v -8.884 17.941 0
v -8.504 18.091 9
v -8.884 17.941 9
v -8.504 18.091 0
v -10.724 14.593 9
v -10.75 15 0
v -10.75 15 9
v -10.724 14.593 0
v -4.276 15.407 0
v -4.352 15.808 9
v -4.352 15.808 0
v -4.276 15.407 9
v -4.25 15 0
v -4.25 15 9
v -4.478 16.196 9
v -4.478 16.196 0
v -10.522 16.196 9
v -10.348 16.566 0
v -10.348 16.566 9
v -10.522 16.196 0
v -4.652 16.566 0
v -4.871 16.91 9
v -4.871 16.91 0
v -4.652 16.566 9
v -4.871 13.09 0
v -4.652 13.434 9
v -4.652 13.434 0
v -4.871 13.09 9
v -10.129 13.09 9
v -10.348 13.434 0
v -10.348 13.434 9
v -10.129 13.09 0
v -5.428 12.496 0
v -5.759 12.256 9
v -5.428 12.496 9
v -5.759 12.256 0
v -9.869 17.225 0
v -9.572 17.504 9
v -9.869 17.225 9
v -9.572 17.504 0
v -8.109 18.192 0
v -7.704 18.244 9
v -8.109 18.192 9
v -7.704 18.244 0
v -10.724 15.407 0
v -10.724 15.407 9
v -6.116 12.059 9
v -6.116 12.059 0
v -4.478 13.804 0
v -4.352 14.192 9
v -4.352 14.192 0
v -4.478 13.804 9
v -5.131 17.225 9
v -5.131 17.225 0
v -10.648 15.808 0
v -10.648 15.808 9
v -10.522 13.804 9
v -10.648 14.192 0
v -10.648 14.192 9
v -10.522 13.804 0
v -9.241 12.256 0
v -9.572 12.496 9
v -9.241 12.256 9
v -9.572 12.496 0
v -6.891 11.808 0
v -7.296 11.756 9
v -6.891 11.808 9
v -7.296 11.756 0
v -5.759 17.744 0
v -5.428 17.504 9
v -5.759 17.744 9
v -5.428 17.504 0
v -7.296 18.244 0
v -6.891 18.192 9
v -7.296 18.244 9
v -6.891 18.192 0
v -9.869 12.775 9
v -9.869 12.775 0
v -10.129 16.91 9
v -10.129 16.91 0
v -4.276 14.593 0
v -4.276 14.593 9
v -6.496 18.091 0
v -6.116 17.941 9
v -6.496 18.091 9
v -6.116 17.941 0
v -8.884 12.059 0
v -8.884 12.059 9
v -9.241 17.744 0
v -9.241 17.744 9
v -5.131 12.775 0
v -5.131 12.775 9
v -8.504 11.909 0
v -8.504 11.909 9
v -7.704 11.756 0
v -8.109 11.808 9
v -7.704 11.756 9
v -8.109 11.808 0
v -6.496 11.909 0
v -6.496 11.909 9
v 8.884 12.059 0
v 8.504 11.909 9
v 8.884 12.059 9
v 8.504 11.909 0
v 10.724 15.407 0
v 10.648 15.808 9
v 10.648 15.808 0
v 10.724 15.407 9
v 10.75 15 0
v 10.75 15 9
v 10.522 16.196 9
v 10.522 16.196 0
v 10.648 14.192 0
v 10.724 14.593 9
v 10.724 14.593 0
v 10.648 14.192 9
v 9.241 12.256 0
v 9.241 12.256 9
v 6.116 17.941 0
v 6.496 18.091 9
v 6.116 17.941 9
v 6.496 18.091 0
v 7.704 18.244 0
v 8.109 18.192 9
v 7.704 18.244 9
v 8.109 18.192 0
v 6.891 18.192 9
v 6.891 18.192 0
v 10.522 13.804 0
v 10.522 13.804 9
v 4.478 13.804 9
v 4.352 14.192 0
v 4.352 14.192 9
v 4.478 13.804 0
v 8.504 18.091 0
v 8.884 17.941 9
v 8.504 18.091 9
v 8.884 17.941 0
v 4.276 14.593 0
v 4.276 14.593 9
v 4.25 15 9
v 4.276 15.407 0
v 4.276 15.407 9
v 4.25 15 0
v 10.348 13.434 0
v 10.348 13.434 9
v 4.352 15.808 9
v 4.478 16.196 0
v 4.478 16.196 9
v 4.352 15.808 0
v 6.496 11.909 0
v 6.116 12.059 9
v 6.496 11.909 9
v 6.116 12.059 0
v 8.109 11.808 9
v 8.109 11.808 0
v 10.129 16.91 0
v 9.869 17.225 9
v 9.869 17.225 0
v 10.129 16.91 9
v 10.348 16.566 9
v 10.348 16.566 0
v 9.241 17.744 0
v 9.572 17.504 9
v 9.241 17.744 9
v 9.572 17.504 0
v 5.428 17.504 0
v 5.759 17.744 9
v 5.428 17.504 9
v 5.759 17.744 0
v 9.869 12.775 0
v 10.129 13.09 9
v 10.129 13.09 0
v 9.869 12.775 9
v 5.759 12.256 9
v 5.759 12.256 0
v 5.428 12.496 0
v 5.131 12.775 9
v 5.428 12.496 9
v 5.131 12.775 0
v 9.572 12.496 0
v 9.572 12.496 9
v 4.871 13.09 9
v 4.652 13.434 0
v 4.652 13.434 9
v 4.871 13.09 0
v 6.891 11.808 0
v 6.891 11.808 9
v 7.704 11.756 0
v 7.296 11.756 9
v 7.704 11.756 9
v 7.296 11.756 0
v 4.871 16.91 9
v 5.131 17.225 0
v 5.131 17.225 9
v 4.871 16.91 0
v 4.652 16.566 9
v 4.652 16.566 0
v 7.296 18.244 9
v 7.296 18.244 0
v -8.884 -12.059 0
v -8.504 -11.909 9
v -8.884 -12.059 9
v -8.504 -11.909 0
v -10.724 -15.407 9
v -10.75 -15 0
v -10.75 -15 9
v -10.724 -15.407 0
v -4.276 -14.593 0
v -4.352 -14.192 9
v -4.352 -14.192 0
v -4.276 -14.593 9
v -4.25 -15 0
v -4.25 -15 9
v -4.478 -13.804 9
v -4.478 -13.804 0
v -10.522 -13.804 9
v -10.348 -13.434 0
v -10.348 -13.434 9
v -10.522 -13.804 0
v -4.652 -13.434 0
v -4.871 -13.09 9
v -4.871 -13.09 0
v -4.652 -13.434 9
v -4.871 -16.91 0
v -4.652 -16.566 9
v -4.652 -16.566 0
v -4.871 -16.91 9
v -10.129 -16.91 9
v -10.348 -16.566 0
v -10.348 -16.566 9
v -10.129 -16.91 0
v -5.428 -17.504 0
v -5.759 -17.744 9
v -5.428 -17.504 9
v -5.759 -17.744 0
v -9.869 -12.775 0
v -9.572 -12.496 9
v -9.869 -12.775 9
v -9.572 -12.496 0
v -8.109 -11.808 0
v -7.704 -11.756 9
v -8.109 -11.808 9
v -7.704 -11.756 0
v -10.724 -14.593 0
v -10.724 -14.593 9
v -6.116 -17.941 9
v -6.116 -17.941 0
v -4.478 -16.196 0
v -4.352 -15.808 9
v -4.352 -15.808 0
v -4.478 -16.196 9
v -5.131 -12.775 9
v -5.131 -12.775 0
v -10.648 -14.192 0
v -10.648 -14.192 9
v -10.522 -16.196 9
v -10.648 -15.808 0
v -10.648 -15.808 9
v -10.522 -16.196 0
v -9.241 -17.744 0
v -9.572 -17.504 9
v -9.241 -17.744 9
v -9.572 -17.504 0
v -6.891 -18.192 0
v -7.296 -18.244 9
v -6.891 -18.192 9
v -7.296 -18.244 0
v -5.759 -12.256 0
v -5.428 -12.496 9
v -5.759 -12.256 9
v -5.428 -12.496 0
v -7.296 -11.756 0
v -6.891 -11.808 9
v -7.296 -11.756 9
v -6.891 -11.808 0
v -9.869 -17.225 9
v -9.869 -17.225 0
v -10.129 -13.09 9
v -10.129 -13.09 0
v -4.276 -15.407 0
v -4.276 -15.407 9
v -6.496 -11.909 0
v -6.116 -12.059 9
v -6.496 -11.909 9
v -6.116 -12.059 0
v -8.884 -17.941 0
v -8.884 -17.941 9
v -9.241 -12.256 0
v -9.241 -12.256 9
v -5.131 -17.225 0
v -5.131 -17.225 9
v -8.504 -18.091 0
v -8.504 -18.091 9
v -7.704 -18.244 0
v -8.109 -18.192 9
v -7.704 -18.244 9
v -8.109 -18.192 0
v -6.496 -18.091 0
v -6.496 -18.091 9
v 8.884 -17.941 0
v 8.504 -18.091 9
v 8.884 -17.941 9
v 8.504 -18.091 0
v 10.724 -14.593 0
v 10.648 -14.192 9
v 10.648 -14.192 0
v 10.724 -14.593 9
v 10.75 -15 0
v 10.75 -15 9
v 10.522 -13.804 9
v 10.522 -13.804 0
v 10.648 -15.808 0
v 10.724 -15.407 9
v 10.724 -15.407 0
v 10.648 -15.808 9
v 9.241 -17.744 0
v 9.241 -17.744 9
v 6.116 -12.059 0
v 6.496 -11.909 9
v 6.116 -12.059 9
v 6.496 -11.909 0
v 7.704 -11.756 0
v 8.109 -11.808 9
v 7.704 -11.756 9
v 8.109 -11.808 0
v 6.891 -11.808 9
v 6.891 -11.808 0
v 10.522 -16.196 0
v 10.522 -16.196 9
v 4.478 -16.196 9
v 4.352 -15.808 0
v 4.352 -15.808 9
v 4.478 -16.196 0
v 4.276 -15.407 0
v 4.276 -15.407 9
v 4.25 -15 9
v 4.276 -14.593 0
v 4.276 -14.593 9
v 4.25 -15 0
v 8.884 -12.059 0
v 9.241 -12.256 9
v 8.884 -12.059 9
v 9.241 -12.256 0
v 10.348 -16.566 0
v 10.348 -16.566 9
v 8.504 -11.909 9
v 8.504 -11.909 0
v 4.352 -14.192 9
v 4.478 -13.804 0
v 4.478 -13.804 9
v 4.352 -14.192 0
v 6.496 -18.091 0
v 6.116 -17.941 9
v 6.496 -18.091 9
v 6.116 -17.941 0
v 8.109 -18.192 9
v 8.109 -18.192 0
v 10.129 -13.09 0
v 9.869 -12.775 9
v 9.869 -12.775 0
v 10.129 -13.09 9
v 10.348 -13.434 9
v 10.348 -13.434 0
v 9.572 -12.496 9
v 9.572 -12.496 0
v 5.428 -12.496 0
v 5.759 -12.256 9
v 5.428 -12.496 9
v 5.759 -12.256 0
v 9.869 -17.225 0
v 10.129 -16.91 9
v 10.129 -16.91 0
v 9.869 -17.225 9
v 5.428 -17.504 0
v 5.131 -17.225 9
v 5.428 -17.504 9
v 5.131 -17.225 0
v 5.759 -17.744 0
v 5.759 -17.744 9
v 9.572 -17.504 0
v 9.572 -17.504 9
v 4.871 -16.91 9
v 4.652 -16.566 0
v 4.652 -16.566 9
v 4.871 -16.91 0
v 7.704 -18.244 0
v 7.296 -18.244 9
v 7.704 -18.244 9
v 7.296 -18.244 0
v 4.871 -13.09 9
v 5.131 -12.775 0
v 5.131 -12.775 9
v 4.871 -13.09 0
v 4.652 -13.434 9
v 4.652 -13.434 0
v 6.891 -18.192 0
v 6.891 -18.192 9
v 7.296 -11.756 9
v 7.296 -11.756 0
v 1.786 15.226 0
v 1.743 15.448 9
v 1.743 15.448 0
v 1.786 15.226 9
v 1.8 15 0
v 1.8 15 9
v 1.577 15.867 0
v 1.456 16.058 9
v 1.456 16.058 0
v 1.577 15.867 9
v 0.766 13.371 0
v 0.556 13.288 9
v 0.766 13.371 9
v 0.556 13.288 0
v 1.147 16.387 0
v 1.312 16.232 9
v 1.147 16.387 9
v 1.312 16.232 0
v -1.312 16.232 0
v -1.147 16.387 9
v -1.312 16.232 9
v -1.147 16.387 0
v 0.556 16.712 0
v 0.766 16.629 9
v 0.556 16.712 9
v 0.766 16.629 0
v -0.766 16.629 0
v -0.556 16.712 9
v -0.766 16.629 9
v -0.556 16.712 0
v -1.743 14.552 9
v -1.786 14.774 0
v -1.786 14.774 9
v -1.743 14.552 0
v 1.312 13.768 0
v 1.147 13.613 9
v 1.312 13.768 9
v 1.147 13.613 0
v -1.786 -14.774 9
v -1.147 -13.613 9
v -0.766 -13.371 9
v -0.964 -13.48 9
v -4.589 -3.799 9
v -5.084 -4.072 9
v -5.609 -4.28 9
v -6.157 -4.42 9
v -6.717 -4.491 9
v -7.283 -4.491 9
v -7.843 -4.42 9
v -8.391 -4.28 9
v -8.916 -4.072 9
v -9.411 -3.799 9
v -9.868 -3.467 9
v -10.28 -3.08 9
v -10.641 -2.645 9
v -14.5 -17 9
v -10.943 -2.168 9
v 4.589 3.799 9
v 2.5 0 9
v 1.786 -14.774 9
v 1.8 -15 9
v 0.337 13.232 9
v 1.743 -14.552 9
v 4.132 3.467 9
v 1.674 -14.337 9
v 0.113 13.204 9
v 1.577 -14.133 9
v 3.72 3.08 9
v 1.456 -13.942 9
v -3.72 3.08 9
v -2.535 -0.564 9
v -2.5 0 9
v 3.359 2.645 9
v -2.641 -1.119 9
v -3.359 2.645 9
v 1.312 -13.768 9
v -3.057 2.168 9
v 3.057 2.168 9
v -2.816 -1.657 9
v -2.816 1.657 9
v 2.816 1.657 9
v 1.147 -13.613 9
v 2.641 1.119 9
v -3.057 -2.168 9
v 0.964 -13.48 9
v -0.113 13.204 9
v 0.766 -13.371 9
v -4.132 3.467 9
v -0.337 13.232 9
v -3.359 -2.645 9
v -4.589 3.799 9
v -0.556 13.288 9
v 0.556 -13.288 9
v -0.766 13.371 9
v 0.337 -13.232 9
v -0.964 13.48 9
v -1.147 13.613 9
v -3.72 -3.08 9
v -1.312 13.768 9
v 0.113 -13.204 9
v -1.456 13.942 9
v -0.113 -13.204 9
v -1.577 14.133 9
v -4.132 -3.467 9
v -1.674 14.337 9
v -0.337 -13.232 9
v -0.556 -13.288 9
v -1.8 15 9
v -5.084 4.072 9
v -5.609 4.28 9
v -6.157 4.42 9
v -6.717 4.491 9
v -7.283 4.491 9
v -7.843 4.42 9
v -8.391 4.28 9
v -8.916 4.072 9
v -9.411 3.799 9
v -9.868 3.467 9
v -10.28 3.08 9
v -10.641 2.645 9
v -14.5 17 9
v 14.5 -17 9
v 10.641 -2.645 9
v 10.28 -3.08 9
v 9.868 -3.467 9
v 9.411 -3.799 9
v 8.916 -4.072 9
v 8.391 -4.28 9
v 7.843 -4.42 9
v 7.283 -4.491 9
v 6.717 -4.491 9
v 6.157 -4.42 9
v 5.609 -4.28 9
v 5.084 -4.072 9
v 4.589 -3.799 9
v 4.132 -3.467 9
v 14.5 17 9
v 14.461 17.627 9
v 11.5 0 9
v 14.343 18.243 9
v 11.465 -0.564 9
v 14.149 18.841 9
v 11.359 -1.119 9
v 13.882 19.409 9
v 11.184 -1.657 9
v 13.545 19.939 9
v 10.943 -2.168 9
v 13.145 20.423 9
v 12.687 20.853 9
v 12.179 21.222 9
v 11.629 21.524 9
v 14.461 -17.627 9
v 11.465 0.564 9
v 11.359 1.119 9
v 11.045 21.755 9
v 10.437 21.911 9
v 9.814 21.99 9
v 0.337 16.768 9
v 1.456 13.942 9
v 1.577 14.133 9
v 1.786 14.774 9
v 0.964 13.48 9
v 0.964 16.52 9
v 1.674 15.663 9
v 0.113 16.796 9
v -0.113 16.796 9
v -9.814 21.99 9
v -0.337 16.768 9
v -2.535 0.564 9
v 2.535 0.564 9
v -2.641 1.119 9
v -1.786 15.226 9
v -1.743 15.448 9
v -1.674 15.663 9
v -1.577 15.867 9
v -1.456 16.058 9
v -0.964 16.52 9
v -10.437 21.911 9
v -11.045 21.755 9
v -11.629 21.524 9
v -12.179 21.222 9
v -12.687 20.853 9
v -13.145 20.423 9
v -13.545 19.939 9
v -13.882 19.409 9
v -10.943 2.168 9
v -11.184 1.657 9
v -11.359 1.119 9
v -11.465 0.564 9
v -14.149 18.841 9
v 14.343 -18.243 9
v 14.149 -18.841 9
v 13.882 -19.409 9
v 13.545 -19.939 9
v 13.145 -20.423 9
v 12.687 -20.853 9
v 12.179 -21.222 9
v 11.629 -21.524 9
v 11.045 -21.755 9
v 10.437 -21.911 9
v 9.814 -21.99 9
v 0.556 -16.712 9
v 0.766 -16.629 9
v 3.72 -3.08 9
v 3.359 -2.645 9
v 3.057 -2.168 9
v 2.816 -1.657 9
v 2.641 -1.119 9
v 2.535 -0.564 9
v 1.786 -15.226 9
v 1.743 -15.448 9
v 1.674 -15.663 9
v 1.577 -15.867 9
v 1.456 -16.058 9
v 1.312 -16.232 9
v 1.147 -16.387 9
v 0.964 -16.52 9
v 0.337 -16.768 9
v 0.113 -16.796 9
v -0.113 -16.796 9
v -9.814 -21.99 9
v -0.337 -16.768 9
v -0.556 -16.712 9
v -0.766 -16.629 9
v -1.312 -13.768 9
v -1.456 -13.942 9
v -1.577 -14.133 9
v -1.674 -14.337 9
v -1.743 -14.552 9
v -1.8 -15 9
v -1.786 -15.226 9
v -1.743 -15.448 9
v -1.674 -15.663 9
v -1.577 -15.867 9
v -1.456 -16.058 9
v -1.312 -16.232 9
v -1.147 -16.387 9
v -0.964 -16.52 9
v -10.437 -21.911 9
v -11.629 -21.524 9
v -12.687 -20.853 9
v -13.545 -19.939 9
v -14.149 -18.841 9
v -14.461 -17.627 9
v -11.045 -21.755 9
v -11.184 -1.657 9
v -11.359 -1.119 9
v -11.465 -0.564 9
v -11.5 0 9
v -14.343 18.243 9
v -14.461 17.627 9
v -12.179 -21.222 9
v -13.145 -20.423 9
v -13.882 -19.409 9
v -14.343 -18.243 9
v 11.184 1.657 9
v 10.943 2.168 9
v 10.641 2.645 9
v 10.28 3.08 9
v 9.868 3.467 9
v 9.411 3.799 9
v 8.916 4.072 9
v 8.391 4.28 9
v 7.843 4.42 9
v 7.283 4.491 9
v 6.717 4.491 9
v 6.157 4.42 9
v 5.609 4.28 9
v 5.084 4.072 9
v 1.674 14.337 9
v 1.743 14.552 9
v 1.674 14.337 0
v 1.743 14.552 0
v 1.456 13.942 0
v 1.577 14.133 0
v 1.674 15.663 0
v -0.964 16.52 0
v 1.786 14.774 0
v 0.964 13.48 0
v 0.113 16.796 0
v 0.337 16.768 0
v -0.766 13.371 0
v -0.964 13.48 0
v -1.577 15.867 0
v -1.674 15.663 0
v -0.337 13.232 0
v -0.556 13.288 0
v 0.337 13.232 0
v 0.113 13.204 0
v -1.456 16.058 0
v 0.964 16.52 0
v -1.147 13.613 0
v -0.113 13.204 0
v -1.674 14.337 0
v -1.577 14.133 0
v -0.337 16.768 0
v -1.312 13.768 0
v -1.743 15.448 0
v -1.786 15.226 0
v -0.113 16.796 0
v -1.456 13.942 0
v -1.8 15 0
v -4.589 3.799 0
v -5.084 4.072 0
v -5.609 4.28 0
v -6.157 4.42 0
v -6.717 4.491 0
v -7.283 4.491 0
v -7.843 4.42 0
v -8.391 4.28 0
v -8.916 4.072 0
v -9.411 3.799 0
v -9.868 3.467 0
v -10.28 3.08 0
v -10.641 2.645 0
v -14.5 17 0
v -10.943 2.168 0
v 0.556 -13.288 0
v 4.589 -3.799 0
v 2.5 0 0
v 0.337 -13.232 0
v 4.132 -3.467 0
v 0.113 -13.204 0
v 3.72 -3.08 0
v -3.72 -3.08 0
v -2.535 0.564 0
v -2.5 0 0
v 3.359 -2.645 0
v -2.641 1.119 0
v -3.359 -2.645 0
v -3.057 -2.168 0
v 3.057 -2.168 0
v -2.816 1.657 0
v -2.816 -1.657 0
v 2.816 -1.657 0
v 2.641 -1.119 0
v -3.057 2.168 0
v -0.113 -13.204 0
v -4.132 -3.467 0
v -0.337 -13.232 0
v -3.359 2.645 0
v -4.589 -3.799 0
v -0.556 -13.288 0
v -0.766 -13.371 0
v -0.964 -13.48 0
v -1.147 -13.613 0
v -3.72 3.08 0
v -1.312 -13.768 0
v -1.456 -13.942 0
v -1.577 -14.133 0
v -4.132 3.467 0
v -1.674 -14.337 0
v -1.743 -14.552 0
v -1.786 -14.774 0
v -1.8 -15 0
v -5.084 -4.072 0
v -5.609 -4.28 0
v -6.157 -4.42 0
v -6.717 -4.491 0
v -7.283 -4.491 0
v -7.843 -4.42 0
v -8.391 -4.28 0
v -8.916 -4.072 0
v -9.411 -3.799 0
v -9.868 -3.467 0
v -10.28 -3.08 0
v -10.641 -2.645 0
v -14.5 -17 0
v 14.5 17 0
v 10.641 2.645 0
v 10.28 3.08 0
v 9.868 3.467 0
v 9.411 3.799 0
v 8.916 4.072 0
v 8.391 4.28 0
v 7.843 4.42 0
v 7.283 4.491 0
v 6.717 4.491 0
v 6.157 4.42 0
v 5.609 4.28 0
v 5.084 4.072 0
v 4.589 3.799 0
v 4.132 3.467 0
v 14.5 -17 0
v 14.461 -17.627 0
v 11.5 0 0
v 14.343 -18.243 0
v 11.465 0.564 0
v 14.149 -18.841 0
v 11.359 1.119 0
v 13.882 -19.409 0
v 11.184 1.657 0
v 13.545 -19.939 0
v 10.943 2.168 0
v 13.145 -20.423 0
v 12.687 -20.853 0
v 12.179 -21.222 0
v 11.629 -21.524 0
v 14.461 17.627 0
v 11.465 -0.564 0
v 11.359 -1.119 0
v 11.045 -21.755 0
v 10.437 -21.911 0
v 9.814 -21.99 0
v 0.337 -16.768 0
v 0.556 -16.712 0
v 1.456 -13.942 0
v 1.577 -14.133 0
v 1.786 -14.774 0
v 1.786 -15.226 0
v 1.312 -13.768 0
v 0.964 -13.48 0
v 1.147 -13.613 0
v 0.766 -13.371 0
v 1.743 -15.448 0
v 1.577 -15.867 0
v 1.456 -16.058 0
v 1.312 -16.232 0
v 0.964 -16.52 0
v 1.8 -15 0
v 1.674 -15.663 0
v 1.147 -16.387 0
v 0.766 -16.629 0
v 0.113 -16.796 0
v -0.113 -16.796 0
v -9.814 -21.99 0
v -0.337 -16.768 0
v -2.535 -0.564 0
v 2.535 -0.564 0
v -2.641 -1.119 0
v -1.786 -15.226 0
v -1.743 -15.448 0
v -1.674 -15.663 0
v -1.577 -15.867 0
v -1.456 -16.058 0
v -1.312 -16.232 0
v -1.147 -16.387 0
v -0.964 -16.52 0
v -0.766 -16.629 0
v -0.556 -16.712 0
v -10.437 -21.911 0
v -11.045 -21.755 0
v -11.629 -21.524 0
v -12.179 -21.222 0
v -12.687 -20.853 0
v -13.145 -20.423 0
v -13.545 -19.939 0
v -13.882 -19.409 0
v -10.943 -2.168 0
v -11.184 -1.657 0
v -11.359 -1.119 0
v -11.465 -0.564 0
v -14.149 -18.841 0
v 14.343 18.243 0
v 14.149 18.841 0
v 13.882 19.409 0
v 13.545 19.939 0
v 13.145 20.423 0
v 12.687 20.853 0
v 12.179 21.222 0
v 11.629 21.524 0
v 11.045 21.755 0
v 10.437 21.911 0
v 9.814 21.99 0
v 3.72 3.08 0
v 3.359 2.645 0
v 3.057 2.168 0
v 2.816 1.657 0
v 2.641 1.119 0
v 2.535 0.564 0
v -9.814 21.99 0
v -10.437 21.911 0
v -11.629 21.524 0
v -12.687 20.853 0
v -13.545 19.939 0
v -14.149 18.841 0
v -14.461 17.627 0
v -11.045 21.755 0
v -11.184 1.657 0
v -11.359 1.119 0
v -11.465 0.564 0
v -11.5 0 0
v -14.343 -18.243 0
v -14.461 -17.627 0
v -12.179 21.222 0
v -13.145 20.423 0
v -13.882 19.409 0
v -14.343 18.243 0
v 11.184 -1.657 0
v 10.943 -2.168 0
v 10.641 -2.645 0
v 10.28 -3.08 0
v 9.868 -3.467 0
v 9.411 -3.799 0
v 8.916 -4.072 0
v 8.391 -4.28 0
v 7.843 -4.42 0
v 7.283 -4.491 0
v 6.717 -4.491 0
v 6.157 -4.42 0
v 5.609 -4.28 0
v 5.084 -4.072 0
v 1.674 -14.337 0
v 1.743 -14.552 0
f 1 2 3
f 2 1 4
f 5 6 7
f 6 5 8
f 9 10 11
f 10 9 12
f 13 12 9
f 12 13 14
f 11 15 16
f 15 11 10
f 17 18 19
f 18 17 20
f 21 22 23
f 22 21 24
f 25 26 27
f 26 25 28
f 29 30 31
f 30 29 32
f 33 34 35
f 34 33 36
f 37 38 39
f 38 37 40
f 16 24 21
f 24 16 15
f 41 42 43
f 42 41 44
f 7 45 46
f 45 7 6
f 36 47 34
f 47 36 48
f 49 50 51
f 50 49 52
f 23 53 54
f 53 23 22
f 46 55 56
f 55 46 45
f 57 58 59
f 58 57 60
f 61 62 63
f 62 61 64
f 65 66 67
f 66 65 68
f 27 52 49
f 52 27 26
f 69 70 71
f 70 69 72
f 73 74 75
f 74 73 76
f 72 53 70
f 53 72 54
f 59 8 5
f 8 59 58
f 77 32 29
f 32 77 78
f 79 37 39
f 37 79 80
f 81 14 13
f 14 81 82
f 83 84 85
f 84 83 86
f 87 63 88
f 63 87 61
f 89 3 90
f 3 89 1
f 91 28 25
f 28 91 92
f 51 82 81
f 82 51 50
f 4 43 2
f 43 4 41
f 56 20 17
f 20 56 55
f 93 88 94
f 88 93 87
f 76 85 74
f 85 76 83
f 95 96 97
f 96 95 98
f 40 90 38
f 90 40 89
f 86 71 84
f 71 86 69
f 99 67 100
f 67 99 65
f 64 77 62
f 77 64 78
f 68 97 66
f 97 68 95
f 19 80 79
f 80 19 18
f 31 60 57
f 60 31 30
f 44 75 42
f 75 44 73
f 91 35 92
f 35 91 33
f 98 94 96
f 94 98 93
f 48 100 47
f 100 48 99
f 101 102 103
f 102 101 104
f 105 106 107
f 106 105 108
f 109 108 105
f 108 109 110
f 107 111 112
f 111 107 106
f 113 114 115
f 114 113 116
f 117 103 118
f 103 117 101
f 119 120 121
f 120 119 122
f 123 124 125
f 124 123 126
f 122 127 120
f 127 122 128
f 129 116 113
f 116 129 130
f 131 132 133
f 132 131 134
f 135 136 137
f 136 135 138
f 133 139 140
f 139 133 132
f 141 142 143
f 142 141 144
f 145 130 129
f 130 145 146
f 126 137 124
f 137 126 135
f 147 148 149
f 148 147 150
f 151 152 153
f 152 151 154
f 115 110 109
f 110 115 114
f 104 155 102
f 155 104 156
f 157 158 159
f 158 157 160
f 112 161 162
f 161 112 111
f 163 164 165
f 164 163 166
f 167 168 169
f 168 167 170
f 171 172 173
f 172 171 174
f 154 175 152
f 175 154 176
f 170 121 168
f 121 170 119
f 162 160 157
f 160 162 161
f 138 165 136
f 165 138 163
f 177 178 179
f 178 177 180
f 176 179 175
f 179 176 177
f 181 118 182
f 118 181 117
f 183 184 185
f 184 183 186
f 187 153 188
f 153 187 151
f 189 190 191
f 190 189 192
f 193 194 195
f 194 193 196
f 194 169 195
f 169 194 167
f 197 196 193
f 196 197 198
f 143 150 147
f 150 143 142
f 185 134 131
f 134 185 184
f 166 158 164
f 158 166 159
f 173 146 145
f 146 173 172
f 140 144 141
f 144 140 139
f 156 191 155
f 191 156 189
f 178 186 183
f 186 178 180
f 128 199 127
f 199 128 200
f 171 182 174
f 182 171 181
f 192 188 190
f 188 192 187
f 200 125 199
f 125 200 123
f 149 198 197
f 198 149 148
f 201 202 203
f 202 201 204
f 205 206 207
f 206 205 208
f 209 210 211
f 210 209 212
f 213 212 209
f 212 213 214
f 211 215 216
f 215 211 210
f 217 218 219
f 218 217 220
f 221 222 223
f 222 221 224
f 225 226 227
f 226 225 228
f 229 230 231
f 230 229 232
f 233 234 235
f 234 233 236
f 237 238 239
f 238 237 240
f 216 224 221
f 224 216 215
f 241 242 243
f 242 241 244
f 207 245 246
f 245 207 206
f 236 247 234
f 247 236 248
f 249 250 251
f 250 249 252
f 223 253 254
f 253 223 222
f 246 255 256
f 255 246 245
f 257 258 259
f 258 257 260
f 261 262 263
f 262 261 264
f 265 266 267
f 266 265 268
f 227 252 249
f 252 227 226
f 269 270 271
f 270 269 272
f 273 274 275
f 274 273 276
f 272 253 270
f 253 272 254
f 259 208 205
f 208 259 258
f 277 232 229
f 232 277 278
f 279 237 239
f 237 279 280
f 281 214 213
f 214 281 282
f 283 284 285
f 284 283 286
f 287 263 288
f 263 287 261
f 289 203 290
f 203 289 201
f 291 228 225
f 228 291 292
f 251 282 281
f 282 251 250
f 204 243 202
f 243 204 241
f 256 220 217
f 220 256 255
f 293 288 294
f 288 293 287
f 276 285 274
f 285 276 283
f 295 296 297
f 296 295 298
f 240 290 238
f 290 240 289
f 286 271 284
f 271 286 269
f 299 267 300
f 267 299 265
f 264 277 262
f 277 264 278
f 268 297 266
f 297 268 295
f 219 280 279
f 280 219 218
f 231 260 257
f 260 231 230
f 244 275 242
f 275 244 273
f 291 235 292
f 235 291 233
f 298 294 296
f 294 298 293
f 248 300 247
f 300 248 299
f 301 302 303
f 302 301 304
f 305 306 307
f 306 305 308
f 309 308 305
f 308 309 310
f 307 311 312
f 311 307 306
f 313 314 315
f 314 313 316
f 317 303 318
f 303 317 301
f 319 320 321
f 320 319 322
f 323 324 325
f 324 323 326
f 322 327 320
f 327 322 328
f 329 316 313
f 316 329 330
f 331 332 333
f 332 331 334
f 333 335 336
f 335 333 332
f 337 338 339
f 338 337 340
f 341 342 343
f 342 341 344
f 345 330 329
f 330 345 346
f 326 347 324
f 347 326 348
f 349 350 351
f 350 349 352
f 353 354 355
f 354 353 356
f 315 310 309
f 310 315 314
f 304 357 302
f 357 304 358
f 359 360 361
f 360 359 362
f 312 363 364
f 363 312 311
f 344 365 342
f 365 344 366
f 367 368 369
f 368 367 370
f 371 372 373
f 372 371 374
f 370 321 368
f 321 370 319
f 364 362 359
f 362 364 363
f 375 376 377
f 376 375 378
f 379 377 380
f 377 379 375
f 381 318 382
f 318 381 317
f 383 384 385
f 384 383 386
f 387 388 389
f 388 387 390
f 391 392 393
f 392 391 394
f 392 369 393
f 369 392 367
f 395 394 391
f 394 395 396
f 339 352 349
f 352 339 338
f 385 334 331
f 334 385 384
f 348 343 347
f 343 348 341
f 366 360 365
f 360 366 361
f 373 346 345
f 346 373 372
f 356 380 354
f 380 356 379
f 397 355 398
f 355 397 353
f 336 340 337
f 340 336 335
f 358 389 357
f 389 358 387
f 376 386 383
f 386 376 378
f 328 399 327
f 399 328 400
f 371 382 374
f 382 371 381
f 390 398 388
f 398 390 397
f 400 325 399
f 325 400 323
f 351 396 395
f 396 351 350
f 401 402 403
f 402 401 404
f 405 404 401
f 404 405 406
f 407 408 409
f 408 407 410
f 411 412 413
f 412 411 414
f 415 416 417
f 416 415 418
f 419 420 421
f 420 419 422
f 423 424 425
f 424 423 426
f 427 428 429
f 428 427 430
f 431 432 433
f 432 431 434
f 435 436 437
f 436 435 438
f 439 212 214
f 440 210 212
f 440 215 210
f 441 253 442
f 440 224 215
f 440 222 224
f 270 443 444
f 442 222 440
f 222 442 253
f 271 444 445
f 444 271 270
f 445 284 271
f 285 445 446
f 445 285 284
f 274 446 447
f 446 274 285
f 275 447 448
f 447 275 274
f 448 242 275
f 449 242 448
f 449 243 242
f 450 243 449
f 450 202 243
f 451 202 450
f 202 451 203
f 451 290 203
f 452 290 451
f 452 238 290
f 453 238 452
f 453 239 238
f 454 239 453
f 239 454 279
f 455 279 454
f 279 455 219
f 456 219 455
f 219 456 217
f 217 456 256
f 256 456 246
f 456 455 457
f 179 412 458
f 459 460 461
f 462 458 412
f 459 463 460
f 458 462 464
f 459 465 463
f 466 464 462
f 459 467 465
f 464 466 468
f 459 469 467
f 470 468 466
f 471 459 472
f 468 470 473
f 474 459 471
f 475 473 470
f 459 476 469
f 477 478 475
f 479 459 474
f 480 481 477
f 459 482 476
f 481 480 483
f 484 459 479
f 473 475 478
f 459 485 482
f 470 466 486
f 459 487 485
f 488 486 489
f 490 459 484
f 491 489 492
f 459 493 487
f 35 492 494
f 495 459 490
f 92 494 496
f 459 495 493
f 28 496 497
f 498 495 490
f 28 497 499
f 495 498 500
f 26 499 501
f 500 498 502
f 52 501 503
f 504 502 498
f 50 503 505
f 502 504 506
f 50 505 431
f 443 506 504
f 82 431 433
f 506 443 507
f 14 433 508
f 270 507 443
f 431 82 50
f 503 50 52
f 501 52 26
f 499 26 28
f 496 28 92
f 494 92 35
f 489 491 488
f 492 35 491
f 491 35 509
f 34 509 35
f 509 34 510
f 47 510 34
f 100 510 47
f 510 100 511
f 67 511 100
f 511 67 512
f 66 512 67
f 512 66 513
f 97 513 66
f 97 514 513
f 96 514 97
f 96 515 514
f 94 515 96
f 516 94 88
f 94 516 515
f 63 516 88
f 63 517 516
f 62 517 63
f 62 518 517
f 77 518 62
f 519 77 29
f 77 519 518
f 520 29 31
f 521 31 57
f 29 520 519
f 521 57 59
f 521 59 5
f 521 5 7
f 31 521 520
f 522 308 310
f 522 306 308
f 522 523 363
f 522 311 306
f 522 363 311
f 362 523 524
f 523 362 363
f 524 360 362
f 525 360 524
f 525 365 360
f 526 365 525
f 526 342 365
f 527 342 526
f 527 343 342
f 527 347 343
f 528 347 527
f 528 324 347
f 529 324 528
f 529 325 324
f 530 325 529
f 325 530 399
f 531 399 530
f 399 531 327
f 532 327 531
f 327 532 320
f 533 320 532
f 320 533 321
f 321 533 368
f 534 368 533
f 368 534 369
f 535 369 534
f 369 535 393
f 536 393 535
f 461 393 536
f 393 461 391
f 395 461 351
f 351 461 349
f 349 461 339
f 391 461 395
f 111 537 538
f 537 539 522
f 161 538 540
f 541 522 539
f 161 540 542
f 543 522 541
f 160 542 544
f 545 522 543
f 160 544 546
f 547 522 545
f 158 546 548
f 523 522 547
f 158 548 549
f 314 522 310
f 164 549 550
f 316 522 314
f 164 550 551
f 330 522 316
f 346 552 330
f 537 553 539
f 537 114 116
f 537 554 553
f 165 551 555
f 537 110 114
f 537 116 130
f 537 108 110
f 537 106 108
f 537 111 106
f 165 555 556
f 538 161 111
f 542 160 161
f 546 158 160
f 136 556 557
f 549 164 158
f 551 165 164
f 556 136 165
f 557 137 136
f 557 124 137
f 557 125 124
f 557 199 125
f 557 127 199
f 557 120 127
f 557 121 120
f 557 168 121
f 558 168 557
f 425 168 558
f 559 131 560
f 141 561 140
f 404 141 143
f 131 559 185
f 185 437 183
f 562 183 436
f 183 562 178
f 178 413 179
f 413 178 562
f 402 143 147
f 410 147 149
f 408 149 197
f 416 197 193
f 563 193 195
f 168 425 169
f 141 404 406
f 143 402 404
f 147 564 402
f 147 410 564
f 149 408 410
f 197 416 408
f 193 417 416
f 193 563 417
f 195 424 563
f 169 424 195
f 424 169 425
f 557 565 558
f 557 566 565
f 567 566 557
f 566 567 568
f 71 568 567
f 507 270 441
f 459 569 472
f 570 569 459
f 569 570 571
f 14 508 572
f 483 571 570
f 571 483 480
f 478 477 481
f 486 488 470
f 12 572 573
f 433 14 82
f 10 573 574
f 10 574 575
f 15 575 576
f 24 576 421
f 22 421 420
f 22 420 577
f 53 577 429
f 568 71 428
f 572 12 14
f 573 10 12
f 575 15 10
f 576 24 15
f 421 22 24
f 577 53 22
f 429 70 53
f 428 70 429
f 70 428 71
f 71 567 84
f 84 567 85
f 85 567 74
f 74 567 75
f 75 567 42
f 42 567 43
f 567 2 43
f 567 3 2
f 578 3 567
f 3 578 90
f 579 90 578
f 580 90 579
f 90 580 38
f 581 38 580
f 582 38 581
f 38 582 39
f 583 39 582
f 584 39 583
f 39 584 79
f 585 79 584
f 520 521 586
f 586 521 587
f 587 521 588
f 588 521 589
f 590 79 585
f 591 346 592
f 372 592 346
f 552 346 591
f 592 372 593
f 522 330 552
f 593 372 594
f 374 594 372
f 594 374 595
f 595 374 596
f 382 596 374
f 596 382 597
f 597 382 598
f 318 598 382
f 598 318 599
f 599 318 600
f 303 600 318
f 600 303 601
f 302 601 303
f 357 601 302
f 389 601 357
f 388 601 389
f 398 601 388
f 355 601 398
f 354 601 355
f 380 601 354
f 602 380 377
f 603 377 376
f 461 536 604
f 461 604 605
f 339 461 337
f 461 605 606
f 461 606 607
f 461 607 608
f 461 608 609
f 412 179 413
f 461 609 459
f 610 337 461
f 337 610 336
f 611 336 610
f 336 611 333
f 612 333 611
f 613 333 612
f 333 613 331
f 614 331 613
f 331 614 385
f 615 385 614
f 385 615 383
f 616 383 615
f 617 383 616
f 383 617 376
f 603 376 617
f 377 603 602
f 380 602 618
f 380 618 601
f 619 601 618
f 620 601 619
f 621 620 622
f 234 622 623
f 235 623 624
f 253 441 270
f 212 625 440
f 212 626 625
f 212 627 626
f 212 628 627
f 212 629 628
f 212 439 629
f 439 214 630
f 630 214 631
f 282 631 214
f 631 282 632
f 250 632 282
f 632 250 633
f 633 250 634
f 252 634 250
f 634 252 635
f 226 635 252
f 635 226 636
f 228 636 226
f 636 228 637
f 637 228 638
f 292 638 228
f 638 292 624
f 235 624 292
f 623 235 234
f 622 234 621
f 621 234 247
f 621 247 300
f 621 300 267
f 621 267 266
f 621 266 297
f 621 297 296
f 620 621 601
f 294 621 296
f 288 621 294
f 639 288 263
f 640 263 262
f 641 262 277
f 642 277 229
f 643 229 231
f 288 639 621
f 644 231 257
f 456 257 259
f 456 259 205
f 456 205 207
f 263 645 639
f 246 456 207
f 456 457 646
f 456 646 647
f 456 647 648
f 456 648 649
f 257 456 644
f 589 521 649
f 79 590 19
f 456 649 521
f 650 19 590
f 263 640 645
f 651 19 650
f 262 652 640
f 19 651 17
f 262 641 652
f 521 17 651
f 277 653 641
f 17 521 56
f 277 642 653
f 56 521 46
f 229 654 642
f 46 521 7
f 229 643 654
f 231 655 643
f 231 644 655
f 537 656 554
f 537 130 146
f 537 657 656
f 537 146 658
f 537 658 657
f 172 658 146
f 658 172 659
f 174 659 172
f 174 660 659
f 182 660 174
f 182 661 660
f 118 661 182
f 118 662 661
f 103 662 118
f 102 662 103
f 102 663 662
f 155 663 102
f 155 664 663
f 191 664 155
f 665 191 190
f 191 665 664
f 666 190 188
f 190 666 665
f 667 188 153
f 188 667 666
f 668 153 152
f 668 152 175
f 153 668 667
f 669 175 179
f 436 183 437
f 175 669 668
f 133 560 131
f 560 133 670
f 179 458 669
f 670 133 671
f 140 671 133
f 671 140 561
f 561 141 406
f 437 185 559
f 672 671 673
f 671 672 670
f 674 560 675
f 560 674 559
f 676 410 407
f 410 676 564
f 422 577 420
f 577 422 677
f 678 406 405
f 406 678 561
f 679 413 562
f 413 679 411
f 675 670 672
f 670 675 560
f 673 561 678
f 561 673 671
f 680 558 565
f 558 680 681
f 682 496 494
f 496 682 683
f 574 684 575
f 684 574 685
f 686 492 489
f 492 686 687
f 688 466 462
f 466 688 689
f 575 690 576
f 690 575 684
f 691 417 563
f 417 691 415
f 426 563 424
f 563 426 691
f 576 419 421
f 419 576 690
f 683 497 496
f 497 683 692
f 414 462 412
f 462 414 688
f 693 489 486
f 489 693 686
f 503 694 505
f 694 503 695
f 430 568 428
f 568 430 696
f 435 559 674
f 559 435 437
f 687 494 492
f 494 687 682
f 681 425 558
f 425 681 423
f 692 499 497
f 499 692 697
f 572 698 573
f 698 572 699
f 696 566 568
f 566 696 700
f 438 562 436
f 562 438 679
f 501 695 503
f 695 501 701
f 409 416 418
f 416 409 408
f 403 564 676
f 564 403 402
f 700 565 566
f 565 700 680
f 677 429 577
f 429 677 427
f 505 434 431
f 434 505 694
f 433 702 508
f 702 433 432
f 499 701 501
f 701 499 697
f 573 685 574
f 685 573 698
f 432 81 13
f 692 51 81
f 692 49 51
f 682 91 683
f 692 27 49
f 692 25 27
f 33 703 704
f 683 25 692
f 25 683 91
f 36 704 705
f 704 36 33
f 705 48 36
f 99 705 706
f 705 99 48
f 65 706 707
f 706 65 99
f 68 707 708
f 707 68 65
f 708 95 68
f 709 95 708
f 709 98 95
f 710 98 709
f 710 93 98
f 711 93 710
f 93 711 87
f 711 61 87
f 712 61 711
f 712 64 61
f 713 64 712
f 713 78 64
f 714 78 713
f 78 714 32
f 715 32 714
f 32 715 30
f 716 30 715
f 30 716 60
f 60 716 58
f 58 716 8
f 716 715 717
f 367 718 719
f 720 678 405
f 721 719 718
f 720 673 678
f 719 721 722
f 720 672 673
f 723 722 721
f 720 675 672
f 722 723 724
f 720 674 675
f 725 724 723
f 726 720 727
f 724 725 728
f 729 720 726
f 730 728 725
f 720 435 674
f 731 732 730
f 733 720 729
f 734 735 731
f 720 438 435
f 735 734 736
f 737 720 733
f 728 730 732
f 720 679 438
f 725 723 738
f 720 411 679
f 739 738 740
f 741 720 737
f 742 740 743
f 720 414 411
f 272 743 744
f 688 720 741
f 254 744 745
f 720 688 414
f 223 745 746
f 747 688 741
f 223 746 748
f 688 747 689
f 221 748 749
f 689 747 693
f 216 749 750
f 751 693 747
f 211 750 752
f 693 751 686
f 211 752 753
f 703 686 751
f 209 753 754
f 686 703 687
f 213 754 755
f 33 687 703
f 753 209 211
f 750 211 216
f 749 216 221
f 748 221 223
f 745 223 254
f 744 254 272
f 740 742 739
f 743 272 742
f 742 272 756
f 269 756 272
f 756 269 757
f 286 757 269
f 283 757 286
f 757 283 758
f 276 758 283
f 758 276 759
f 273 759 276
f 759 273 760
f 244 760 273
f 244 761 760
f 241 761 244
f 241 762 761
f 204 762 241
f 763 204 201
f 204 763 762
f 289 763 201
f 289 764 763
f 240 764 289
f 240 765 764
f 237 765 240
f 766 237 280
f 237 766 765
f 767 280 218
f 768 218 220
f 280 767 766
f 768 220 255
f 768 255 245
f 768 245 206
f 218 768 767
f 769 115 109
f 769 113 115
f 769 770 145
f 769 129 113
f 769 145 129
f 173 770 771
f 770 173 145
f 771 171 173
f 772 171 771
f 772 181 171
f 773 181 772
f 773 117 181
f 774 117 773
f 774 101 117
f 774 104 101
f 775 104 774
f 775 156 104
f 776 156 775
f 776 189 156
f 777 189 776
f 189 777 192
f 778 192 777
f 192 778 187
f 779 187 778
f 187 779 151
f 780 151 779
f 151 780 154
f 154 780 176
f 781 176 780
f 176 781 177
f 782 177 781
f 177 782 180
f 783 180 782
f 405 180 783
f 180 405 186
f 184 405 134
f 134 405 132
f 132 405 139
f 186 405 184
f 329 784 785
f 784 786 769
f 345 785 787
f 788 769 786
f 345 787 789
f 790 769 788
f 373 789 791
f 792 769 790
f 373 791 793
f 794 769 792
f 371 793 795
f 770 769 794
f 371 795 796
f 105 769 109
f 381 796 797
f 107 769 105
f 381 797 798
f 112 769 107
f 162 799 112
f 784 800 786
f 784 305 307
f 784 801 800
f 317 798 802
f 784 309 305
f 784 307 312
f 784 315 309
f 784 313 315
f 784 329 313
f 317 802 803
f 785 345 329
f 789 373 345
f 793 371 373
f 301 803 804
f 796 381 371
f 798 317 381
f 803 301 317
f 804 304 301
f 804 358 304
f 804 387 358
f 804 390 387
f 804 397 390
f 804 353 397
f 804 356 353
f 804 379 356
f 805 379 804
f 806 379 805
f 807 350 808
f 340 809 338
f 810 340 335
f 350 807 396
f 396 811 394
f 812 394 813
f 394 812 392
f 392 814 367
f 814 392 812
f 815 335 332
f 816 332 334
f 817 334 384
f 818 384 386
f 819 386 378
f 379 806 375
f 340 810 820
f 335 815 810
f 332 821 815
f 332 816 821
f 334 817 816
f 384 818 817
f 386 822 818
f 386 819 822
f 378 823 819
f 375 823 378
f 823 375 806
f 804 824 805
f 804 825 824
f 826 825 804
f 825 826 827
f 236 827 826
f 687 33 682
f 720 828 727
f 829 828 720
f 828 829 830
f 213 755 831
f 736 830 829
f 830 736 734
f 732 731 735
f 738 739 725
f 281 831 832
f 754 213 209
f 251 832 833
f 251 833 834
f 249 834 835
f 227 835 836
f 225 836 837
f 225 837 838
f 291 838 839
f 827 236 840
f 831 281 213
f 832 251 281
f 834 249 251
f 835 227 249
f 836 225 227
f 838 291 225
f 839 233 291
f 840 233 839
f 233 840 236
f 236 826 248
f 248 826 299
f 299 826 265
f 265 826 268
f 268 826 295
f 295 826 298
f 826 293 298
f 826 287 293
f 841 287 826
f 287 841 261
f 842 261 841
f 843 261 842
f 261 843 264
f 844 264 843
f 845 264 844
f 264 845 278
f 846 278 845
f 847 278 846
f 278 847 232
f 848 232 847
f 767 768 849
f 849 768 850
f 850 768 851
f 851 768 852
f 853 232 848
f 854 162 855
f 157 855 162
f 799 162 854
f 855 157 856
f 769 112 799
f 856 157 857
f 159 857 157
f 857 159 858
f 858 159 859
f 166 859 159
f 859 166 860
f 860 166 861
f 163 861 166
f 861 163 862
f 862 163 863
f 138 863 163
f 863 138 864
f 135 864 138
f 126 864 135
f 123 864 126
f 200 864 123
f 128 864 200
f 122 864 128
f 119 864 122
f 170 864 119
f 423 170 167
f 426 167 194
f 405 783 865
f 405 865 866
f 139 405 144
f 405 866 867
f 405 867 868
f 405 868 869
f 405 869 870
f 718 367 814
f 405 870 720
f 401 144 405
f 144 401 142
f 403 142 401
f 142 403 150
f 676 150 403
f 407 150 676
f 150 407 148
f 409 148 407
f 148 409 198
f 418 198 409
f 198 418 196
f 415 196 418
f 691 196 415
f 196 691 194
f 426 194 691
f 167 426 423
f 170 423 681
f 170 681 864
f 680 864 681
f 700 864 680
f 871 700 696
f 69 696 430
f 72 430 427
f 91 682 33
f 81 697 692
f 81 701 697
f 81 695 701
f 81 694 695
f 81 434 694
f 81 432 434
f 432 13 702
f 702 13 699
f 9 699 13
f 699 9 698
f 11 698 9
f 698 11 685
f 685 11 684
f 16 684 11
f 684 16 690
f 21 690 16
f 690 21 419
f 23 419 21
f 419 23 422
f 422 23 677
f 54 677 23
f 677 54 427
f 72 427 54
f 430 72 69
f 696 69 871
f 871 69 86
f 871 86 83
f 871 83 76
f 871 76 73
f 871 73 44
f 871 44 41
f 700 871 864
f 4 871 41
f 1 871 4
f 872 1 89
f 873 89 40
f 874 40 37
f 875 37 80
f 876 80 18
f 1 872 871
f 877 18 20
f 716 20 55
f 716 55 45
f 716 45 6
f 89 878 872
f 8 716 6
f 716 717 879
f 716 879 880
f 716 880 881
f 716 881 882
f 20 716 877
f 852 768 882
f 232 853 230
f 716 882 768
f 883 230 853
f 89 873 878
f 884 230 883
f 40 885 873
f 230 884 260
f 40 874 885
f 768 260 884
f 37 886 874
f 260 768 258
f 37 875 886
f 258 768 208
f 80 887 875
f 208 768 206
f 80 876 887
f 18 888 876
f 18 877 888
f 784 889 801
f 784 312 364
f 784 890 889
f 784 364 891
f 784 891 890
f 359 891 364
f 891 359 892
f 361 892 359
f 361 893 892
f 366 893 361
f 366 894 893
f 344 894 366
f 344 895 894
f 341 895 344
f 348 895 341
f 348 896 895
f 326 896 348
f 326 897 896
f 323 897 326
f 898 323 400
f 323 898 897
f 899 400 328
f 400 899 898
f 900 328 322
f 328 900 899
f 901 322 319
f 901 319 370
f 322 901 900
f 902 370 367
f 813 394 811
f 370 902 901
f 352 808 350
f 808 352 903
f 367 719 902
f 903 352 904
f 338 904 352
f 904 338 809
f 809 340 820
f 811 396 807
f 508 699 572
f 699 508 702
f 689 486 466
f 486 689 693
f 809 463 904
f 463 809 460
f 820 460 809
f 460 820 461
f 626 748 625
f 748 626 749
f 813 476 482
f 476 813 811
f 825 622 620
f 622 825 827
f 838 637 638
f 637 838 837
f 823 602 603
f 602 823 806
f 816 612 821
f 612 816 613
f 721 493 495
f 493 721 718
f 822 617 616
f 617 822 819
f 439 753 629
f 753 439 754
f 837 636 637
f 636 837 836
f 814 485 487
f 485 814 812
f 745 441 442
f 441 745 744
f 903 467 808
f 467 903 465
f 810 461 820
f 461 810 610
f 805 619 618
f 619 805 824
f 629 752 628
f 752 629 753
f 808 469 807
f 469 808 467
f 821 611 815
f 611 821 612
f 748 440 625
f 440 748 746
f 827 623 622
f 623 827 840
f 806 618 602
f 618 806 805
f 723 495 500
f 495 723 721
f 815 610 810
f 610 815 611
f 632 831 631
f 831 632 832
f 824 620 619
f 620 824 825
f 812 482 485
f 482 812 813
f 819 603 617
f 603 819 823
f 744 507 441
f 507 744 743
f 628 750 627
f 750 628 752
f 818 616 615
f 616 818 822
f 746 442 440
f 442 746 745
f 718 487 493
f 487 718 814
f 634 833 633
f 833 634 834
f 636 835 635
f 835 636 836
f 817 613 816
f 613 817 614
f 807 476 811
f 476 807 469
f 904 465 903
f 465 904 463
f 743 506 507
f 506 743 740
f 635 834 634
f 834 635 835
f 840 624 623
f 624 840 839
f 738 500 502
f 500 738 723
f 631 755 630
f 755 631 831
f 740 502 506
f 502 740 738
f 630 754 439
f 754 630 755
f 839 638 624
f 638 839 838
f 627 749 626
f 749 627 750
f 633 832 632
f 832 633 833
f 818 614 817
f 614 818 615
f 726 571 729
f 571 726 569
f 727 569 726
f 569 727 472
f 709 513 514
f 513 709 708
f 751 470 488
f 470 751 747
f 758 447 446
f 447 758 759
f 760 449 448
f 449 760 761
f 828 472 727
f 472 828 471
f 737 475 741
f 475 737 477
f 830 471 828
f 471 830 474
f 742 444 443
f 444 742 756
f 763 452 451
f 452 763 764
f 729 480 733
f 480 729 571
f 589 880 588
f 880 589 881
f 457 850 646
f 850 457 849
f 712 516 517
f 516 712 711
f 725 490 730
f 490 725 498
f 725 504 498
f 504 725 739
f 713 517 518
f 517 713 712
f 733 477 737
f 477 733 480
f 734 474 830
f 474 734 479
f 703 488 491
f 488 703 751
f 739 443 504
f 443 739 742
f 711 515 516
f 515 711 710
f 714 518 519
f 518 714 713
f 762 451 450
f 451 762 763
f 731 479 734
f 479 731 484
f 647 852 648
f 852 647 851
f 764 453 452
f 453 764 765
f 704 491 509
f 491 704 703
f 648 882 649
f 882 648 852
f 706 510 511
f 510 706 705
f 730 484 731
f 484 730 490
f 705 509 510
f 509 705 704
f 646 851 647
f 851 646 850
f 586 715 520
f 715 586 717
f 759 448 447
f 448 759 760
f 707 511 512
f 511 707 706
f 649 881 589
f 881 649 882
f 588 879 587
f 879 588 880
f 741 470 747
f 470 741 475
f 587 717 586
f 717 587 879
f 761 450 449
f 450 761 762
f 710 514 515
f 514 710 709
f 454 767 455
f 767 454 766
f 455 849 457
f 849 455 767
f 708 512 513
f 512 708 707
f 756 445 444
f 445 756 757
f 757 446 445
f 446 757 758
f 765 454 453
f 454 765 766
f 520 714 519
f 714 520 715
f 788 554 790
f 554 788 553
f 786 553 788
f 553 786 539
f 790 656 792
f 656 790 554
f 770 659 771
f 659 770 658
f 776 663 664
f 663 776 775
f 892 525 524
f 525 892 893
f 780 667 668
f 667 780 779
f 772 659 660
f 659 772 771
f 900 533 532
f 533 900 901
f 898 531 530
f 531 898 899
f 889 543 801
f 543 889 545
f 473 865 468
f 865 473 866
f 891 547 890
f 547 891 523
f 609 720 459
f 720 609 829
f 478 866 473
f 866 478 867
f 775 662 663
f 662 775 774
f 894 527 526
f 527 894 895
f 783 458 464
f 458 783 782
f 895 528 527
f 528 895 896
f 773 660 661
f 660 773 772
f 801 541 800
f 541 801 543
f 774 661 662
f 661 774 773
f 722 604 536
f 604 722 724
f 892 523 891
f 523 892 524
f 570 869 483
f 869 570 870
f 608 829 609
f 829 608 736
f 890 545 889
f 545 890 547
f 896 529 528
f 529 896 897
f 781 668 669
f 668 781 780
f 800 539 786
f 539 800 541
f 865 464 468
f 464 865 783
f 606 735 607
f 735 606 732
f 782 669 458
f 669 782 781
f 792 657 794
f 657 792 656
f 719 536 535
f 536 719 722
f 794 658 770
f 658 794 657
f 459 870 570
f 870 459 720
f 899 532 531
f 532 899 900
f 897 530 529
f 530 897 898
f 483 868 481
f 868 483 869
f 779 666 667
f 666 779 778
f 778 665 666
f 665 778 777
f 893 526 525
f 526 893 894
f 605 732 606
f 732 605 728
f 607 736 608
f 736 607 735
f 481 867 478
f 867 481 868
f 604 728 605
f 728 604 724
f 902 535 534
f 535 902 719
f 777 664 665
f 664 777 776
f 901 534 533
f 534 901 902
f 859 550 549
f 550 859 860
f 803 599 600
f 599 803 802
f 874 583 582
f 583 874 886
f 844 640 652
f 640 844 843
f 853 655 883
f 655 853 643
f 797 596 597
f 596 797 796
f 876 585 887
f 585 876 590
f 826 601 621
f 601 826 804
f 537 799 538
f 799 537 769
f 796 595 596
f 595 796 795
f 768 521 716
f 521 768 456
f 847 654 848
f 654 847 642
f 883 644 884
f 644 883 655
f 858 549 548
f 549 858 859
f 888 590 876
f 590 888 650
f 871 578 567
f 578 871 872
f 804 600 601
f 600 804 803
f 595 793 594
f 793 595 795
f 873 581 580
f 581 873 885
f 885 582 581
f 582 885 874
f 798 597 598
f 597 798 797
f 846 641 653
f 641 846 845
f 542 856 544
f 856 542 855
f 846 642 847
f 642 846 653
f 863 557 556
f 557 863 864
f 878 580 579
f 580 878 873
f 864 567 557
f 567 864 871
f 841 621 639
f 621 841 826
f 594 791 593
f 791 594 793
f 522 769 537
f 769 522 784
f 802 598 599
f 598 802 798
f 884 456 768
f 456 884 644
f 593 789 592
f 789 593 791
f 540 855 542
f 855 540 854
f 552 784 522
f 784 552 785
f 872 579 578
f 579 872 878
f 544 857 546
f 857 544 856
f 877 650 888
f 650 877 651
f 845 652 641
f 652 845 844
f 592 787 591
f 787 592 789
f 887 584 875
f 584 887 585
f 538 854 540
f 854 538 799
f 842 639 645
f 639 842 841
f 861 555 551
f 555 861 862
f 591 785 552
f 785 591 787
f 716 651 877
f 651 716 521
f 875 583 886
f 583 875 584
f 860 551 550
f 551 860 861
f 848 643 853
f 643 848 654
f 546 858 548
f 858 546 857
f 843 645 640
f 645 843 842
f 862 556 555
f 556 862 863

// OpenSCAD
$fn = 50;


difference() {
	union() {
		hull() {
			translate(v = [-9.5000000000, 17.0000000000, 0]) {
				cylinder(h = 9, r = 5);
			}
			translate(v = [9.5000000000, 17.0000000000, 0]) {
				cylinder(h = 9, r = 5);
			}
			translate(v = [-9.5000000000, -17.0000000000, 0]) {
				cylinder(h = 9, r = 5);
			}
			translate(v = [9.5000000000, -17.0000000000, 0]) {
				cylinder(h = 9, r = 5);
			}
		}
	}
	union() {
		#translate(v = [-7.5000000000, 15.0000000000, 0]) {
			cylinder(h = 9, r = 3.2500000000);
		}
		#translate(v = [7.5000000000, 15.0000000000, 0]) {
			cylinder(h = 9, r = 3.2500000000);
		}
		#translate(v = [-7.5000000000, -15.0000000000, 0]) {
			cylinder(h = 9, r = 3.2500000000);
		}
		#translate(v = [7.5000000000, -15.0000000000, 0]) {
			cylinder(h = 9, r = 3.2500000000);
		}
		#translate(v = [-7.5000000000, -15.0000000000, -100.0000000000]) {
			cylinder(h = 200, r = 3.2500000000);
		}
		#translate(v = [-7.5000000000, 15.0000000000, -100.0000000000]) {
			cylinder(h = 200, r = 3.2500000000);
		}
		#translate(v = [7.5000000000, -15.0000000000, -100.0000000000]) {
			cylinder(h = 200, r = 3.2500000000);
		}
		#translate(v = [7.5000000000, 15.0000000000, -100.0000000000]) {
			cylinder(h = 200, r = 3.2500000000);
		}
		#translate(v = [-7.5000000000, 15.0000000000, 0]) {
			cylinder(h = 9, r = 1.8000000000);
		}
		#translate(v = [0.0000000000, 15.0000000000, 0]) {
			cylinder(h = 9, r = 1.8000000000);
		}
		#translate(v = [7.5000000000, 15.0000000000, 0]) {
			cylinder(h = 9, r = 1.8000000000);
		}
		#translate(v = [-7.5000000000, -15.0000000000, 0]) {
			cylinder(h = 9, r = 1.8000000000);
		}
		#translate(v = [0.0000000000, -15.0000000000, 0]) {
			cylinder(h = 9, r = 1.8000000000);
		}
		#translate(v = [7.5000000000, -15.0000000000, 0]) {
			cylinder(h = 9, r = 1.8000000000);
		}
		#translate(v = [-7.5000000000, 15.0000000000, 0]) {
			cylinder(h = 9, r = 1.8000000000);
		}
		#translate(v = [0.0000000000, 15.0000000000, 0]) {
			cylinder(h = 9, r = 1.8000000000);
		}
		#translate(v = [7.5000000000, 15.0000000000, 0]) {
			cylinder(h = 9, r = 1.8000000000);
		}
		#translate(v = [-7.5000000000, -15.0000000000, 0]) {
			cylinder(h = 9, r = 1.8000000000);
		}
		#translate(v = [0.0000000000, -15.0000000000, 0]) {
			cylinder(h = 9, r = 1.8000000000);
		}
		#translate(v = [7.5000000000, -15.0000000000, 0]) {
			cylinder(h = 9, r = 1.8000000000);
		}
		#translate(v = [-7.5000000000, 15.0000000000, 0]) {
			cylinder(h = 9, r = 1.8000000000);
		}
		#translate(v = [0.0000000000, 15.0000000000, 0]) {
			cylinder(h = 9, r = 1.8000000000);
		}
		#translate(v = [7.5000000000, 15.0000000000, 0]) {
			cylinder(h = 9, r = 1.8000000000);
		}
		#translate(v = [-7.5000000000, -15.0000000000, 0]) {
			cylinder(h = 9, r = 1.8000000000);
		}
		#translate(v = [0.0000000000, -15.0000000000, 0]) {
			cylinder(h = 9, r = 1.8000000000);
		}
		#translate(v = [7.5000000000, -15.0000000000, 0]) {
			cylinder(h = 9, r = 1.8000000000);
		}
		#translate(v = [-7.0000000000, 0, 0]) {
			cylinder(h = 9, r = 4.5000000000);
		}
		#translate(v = [7.0000000000, 0, 0]) {
			cylinder(h = 9, r = 4.5000000000);
		}
	}
}
